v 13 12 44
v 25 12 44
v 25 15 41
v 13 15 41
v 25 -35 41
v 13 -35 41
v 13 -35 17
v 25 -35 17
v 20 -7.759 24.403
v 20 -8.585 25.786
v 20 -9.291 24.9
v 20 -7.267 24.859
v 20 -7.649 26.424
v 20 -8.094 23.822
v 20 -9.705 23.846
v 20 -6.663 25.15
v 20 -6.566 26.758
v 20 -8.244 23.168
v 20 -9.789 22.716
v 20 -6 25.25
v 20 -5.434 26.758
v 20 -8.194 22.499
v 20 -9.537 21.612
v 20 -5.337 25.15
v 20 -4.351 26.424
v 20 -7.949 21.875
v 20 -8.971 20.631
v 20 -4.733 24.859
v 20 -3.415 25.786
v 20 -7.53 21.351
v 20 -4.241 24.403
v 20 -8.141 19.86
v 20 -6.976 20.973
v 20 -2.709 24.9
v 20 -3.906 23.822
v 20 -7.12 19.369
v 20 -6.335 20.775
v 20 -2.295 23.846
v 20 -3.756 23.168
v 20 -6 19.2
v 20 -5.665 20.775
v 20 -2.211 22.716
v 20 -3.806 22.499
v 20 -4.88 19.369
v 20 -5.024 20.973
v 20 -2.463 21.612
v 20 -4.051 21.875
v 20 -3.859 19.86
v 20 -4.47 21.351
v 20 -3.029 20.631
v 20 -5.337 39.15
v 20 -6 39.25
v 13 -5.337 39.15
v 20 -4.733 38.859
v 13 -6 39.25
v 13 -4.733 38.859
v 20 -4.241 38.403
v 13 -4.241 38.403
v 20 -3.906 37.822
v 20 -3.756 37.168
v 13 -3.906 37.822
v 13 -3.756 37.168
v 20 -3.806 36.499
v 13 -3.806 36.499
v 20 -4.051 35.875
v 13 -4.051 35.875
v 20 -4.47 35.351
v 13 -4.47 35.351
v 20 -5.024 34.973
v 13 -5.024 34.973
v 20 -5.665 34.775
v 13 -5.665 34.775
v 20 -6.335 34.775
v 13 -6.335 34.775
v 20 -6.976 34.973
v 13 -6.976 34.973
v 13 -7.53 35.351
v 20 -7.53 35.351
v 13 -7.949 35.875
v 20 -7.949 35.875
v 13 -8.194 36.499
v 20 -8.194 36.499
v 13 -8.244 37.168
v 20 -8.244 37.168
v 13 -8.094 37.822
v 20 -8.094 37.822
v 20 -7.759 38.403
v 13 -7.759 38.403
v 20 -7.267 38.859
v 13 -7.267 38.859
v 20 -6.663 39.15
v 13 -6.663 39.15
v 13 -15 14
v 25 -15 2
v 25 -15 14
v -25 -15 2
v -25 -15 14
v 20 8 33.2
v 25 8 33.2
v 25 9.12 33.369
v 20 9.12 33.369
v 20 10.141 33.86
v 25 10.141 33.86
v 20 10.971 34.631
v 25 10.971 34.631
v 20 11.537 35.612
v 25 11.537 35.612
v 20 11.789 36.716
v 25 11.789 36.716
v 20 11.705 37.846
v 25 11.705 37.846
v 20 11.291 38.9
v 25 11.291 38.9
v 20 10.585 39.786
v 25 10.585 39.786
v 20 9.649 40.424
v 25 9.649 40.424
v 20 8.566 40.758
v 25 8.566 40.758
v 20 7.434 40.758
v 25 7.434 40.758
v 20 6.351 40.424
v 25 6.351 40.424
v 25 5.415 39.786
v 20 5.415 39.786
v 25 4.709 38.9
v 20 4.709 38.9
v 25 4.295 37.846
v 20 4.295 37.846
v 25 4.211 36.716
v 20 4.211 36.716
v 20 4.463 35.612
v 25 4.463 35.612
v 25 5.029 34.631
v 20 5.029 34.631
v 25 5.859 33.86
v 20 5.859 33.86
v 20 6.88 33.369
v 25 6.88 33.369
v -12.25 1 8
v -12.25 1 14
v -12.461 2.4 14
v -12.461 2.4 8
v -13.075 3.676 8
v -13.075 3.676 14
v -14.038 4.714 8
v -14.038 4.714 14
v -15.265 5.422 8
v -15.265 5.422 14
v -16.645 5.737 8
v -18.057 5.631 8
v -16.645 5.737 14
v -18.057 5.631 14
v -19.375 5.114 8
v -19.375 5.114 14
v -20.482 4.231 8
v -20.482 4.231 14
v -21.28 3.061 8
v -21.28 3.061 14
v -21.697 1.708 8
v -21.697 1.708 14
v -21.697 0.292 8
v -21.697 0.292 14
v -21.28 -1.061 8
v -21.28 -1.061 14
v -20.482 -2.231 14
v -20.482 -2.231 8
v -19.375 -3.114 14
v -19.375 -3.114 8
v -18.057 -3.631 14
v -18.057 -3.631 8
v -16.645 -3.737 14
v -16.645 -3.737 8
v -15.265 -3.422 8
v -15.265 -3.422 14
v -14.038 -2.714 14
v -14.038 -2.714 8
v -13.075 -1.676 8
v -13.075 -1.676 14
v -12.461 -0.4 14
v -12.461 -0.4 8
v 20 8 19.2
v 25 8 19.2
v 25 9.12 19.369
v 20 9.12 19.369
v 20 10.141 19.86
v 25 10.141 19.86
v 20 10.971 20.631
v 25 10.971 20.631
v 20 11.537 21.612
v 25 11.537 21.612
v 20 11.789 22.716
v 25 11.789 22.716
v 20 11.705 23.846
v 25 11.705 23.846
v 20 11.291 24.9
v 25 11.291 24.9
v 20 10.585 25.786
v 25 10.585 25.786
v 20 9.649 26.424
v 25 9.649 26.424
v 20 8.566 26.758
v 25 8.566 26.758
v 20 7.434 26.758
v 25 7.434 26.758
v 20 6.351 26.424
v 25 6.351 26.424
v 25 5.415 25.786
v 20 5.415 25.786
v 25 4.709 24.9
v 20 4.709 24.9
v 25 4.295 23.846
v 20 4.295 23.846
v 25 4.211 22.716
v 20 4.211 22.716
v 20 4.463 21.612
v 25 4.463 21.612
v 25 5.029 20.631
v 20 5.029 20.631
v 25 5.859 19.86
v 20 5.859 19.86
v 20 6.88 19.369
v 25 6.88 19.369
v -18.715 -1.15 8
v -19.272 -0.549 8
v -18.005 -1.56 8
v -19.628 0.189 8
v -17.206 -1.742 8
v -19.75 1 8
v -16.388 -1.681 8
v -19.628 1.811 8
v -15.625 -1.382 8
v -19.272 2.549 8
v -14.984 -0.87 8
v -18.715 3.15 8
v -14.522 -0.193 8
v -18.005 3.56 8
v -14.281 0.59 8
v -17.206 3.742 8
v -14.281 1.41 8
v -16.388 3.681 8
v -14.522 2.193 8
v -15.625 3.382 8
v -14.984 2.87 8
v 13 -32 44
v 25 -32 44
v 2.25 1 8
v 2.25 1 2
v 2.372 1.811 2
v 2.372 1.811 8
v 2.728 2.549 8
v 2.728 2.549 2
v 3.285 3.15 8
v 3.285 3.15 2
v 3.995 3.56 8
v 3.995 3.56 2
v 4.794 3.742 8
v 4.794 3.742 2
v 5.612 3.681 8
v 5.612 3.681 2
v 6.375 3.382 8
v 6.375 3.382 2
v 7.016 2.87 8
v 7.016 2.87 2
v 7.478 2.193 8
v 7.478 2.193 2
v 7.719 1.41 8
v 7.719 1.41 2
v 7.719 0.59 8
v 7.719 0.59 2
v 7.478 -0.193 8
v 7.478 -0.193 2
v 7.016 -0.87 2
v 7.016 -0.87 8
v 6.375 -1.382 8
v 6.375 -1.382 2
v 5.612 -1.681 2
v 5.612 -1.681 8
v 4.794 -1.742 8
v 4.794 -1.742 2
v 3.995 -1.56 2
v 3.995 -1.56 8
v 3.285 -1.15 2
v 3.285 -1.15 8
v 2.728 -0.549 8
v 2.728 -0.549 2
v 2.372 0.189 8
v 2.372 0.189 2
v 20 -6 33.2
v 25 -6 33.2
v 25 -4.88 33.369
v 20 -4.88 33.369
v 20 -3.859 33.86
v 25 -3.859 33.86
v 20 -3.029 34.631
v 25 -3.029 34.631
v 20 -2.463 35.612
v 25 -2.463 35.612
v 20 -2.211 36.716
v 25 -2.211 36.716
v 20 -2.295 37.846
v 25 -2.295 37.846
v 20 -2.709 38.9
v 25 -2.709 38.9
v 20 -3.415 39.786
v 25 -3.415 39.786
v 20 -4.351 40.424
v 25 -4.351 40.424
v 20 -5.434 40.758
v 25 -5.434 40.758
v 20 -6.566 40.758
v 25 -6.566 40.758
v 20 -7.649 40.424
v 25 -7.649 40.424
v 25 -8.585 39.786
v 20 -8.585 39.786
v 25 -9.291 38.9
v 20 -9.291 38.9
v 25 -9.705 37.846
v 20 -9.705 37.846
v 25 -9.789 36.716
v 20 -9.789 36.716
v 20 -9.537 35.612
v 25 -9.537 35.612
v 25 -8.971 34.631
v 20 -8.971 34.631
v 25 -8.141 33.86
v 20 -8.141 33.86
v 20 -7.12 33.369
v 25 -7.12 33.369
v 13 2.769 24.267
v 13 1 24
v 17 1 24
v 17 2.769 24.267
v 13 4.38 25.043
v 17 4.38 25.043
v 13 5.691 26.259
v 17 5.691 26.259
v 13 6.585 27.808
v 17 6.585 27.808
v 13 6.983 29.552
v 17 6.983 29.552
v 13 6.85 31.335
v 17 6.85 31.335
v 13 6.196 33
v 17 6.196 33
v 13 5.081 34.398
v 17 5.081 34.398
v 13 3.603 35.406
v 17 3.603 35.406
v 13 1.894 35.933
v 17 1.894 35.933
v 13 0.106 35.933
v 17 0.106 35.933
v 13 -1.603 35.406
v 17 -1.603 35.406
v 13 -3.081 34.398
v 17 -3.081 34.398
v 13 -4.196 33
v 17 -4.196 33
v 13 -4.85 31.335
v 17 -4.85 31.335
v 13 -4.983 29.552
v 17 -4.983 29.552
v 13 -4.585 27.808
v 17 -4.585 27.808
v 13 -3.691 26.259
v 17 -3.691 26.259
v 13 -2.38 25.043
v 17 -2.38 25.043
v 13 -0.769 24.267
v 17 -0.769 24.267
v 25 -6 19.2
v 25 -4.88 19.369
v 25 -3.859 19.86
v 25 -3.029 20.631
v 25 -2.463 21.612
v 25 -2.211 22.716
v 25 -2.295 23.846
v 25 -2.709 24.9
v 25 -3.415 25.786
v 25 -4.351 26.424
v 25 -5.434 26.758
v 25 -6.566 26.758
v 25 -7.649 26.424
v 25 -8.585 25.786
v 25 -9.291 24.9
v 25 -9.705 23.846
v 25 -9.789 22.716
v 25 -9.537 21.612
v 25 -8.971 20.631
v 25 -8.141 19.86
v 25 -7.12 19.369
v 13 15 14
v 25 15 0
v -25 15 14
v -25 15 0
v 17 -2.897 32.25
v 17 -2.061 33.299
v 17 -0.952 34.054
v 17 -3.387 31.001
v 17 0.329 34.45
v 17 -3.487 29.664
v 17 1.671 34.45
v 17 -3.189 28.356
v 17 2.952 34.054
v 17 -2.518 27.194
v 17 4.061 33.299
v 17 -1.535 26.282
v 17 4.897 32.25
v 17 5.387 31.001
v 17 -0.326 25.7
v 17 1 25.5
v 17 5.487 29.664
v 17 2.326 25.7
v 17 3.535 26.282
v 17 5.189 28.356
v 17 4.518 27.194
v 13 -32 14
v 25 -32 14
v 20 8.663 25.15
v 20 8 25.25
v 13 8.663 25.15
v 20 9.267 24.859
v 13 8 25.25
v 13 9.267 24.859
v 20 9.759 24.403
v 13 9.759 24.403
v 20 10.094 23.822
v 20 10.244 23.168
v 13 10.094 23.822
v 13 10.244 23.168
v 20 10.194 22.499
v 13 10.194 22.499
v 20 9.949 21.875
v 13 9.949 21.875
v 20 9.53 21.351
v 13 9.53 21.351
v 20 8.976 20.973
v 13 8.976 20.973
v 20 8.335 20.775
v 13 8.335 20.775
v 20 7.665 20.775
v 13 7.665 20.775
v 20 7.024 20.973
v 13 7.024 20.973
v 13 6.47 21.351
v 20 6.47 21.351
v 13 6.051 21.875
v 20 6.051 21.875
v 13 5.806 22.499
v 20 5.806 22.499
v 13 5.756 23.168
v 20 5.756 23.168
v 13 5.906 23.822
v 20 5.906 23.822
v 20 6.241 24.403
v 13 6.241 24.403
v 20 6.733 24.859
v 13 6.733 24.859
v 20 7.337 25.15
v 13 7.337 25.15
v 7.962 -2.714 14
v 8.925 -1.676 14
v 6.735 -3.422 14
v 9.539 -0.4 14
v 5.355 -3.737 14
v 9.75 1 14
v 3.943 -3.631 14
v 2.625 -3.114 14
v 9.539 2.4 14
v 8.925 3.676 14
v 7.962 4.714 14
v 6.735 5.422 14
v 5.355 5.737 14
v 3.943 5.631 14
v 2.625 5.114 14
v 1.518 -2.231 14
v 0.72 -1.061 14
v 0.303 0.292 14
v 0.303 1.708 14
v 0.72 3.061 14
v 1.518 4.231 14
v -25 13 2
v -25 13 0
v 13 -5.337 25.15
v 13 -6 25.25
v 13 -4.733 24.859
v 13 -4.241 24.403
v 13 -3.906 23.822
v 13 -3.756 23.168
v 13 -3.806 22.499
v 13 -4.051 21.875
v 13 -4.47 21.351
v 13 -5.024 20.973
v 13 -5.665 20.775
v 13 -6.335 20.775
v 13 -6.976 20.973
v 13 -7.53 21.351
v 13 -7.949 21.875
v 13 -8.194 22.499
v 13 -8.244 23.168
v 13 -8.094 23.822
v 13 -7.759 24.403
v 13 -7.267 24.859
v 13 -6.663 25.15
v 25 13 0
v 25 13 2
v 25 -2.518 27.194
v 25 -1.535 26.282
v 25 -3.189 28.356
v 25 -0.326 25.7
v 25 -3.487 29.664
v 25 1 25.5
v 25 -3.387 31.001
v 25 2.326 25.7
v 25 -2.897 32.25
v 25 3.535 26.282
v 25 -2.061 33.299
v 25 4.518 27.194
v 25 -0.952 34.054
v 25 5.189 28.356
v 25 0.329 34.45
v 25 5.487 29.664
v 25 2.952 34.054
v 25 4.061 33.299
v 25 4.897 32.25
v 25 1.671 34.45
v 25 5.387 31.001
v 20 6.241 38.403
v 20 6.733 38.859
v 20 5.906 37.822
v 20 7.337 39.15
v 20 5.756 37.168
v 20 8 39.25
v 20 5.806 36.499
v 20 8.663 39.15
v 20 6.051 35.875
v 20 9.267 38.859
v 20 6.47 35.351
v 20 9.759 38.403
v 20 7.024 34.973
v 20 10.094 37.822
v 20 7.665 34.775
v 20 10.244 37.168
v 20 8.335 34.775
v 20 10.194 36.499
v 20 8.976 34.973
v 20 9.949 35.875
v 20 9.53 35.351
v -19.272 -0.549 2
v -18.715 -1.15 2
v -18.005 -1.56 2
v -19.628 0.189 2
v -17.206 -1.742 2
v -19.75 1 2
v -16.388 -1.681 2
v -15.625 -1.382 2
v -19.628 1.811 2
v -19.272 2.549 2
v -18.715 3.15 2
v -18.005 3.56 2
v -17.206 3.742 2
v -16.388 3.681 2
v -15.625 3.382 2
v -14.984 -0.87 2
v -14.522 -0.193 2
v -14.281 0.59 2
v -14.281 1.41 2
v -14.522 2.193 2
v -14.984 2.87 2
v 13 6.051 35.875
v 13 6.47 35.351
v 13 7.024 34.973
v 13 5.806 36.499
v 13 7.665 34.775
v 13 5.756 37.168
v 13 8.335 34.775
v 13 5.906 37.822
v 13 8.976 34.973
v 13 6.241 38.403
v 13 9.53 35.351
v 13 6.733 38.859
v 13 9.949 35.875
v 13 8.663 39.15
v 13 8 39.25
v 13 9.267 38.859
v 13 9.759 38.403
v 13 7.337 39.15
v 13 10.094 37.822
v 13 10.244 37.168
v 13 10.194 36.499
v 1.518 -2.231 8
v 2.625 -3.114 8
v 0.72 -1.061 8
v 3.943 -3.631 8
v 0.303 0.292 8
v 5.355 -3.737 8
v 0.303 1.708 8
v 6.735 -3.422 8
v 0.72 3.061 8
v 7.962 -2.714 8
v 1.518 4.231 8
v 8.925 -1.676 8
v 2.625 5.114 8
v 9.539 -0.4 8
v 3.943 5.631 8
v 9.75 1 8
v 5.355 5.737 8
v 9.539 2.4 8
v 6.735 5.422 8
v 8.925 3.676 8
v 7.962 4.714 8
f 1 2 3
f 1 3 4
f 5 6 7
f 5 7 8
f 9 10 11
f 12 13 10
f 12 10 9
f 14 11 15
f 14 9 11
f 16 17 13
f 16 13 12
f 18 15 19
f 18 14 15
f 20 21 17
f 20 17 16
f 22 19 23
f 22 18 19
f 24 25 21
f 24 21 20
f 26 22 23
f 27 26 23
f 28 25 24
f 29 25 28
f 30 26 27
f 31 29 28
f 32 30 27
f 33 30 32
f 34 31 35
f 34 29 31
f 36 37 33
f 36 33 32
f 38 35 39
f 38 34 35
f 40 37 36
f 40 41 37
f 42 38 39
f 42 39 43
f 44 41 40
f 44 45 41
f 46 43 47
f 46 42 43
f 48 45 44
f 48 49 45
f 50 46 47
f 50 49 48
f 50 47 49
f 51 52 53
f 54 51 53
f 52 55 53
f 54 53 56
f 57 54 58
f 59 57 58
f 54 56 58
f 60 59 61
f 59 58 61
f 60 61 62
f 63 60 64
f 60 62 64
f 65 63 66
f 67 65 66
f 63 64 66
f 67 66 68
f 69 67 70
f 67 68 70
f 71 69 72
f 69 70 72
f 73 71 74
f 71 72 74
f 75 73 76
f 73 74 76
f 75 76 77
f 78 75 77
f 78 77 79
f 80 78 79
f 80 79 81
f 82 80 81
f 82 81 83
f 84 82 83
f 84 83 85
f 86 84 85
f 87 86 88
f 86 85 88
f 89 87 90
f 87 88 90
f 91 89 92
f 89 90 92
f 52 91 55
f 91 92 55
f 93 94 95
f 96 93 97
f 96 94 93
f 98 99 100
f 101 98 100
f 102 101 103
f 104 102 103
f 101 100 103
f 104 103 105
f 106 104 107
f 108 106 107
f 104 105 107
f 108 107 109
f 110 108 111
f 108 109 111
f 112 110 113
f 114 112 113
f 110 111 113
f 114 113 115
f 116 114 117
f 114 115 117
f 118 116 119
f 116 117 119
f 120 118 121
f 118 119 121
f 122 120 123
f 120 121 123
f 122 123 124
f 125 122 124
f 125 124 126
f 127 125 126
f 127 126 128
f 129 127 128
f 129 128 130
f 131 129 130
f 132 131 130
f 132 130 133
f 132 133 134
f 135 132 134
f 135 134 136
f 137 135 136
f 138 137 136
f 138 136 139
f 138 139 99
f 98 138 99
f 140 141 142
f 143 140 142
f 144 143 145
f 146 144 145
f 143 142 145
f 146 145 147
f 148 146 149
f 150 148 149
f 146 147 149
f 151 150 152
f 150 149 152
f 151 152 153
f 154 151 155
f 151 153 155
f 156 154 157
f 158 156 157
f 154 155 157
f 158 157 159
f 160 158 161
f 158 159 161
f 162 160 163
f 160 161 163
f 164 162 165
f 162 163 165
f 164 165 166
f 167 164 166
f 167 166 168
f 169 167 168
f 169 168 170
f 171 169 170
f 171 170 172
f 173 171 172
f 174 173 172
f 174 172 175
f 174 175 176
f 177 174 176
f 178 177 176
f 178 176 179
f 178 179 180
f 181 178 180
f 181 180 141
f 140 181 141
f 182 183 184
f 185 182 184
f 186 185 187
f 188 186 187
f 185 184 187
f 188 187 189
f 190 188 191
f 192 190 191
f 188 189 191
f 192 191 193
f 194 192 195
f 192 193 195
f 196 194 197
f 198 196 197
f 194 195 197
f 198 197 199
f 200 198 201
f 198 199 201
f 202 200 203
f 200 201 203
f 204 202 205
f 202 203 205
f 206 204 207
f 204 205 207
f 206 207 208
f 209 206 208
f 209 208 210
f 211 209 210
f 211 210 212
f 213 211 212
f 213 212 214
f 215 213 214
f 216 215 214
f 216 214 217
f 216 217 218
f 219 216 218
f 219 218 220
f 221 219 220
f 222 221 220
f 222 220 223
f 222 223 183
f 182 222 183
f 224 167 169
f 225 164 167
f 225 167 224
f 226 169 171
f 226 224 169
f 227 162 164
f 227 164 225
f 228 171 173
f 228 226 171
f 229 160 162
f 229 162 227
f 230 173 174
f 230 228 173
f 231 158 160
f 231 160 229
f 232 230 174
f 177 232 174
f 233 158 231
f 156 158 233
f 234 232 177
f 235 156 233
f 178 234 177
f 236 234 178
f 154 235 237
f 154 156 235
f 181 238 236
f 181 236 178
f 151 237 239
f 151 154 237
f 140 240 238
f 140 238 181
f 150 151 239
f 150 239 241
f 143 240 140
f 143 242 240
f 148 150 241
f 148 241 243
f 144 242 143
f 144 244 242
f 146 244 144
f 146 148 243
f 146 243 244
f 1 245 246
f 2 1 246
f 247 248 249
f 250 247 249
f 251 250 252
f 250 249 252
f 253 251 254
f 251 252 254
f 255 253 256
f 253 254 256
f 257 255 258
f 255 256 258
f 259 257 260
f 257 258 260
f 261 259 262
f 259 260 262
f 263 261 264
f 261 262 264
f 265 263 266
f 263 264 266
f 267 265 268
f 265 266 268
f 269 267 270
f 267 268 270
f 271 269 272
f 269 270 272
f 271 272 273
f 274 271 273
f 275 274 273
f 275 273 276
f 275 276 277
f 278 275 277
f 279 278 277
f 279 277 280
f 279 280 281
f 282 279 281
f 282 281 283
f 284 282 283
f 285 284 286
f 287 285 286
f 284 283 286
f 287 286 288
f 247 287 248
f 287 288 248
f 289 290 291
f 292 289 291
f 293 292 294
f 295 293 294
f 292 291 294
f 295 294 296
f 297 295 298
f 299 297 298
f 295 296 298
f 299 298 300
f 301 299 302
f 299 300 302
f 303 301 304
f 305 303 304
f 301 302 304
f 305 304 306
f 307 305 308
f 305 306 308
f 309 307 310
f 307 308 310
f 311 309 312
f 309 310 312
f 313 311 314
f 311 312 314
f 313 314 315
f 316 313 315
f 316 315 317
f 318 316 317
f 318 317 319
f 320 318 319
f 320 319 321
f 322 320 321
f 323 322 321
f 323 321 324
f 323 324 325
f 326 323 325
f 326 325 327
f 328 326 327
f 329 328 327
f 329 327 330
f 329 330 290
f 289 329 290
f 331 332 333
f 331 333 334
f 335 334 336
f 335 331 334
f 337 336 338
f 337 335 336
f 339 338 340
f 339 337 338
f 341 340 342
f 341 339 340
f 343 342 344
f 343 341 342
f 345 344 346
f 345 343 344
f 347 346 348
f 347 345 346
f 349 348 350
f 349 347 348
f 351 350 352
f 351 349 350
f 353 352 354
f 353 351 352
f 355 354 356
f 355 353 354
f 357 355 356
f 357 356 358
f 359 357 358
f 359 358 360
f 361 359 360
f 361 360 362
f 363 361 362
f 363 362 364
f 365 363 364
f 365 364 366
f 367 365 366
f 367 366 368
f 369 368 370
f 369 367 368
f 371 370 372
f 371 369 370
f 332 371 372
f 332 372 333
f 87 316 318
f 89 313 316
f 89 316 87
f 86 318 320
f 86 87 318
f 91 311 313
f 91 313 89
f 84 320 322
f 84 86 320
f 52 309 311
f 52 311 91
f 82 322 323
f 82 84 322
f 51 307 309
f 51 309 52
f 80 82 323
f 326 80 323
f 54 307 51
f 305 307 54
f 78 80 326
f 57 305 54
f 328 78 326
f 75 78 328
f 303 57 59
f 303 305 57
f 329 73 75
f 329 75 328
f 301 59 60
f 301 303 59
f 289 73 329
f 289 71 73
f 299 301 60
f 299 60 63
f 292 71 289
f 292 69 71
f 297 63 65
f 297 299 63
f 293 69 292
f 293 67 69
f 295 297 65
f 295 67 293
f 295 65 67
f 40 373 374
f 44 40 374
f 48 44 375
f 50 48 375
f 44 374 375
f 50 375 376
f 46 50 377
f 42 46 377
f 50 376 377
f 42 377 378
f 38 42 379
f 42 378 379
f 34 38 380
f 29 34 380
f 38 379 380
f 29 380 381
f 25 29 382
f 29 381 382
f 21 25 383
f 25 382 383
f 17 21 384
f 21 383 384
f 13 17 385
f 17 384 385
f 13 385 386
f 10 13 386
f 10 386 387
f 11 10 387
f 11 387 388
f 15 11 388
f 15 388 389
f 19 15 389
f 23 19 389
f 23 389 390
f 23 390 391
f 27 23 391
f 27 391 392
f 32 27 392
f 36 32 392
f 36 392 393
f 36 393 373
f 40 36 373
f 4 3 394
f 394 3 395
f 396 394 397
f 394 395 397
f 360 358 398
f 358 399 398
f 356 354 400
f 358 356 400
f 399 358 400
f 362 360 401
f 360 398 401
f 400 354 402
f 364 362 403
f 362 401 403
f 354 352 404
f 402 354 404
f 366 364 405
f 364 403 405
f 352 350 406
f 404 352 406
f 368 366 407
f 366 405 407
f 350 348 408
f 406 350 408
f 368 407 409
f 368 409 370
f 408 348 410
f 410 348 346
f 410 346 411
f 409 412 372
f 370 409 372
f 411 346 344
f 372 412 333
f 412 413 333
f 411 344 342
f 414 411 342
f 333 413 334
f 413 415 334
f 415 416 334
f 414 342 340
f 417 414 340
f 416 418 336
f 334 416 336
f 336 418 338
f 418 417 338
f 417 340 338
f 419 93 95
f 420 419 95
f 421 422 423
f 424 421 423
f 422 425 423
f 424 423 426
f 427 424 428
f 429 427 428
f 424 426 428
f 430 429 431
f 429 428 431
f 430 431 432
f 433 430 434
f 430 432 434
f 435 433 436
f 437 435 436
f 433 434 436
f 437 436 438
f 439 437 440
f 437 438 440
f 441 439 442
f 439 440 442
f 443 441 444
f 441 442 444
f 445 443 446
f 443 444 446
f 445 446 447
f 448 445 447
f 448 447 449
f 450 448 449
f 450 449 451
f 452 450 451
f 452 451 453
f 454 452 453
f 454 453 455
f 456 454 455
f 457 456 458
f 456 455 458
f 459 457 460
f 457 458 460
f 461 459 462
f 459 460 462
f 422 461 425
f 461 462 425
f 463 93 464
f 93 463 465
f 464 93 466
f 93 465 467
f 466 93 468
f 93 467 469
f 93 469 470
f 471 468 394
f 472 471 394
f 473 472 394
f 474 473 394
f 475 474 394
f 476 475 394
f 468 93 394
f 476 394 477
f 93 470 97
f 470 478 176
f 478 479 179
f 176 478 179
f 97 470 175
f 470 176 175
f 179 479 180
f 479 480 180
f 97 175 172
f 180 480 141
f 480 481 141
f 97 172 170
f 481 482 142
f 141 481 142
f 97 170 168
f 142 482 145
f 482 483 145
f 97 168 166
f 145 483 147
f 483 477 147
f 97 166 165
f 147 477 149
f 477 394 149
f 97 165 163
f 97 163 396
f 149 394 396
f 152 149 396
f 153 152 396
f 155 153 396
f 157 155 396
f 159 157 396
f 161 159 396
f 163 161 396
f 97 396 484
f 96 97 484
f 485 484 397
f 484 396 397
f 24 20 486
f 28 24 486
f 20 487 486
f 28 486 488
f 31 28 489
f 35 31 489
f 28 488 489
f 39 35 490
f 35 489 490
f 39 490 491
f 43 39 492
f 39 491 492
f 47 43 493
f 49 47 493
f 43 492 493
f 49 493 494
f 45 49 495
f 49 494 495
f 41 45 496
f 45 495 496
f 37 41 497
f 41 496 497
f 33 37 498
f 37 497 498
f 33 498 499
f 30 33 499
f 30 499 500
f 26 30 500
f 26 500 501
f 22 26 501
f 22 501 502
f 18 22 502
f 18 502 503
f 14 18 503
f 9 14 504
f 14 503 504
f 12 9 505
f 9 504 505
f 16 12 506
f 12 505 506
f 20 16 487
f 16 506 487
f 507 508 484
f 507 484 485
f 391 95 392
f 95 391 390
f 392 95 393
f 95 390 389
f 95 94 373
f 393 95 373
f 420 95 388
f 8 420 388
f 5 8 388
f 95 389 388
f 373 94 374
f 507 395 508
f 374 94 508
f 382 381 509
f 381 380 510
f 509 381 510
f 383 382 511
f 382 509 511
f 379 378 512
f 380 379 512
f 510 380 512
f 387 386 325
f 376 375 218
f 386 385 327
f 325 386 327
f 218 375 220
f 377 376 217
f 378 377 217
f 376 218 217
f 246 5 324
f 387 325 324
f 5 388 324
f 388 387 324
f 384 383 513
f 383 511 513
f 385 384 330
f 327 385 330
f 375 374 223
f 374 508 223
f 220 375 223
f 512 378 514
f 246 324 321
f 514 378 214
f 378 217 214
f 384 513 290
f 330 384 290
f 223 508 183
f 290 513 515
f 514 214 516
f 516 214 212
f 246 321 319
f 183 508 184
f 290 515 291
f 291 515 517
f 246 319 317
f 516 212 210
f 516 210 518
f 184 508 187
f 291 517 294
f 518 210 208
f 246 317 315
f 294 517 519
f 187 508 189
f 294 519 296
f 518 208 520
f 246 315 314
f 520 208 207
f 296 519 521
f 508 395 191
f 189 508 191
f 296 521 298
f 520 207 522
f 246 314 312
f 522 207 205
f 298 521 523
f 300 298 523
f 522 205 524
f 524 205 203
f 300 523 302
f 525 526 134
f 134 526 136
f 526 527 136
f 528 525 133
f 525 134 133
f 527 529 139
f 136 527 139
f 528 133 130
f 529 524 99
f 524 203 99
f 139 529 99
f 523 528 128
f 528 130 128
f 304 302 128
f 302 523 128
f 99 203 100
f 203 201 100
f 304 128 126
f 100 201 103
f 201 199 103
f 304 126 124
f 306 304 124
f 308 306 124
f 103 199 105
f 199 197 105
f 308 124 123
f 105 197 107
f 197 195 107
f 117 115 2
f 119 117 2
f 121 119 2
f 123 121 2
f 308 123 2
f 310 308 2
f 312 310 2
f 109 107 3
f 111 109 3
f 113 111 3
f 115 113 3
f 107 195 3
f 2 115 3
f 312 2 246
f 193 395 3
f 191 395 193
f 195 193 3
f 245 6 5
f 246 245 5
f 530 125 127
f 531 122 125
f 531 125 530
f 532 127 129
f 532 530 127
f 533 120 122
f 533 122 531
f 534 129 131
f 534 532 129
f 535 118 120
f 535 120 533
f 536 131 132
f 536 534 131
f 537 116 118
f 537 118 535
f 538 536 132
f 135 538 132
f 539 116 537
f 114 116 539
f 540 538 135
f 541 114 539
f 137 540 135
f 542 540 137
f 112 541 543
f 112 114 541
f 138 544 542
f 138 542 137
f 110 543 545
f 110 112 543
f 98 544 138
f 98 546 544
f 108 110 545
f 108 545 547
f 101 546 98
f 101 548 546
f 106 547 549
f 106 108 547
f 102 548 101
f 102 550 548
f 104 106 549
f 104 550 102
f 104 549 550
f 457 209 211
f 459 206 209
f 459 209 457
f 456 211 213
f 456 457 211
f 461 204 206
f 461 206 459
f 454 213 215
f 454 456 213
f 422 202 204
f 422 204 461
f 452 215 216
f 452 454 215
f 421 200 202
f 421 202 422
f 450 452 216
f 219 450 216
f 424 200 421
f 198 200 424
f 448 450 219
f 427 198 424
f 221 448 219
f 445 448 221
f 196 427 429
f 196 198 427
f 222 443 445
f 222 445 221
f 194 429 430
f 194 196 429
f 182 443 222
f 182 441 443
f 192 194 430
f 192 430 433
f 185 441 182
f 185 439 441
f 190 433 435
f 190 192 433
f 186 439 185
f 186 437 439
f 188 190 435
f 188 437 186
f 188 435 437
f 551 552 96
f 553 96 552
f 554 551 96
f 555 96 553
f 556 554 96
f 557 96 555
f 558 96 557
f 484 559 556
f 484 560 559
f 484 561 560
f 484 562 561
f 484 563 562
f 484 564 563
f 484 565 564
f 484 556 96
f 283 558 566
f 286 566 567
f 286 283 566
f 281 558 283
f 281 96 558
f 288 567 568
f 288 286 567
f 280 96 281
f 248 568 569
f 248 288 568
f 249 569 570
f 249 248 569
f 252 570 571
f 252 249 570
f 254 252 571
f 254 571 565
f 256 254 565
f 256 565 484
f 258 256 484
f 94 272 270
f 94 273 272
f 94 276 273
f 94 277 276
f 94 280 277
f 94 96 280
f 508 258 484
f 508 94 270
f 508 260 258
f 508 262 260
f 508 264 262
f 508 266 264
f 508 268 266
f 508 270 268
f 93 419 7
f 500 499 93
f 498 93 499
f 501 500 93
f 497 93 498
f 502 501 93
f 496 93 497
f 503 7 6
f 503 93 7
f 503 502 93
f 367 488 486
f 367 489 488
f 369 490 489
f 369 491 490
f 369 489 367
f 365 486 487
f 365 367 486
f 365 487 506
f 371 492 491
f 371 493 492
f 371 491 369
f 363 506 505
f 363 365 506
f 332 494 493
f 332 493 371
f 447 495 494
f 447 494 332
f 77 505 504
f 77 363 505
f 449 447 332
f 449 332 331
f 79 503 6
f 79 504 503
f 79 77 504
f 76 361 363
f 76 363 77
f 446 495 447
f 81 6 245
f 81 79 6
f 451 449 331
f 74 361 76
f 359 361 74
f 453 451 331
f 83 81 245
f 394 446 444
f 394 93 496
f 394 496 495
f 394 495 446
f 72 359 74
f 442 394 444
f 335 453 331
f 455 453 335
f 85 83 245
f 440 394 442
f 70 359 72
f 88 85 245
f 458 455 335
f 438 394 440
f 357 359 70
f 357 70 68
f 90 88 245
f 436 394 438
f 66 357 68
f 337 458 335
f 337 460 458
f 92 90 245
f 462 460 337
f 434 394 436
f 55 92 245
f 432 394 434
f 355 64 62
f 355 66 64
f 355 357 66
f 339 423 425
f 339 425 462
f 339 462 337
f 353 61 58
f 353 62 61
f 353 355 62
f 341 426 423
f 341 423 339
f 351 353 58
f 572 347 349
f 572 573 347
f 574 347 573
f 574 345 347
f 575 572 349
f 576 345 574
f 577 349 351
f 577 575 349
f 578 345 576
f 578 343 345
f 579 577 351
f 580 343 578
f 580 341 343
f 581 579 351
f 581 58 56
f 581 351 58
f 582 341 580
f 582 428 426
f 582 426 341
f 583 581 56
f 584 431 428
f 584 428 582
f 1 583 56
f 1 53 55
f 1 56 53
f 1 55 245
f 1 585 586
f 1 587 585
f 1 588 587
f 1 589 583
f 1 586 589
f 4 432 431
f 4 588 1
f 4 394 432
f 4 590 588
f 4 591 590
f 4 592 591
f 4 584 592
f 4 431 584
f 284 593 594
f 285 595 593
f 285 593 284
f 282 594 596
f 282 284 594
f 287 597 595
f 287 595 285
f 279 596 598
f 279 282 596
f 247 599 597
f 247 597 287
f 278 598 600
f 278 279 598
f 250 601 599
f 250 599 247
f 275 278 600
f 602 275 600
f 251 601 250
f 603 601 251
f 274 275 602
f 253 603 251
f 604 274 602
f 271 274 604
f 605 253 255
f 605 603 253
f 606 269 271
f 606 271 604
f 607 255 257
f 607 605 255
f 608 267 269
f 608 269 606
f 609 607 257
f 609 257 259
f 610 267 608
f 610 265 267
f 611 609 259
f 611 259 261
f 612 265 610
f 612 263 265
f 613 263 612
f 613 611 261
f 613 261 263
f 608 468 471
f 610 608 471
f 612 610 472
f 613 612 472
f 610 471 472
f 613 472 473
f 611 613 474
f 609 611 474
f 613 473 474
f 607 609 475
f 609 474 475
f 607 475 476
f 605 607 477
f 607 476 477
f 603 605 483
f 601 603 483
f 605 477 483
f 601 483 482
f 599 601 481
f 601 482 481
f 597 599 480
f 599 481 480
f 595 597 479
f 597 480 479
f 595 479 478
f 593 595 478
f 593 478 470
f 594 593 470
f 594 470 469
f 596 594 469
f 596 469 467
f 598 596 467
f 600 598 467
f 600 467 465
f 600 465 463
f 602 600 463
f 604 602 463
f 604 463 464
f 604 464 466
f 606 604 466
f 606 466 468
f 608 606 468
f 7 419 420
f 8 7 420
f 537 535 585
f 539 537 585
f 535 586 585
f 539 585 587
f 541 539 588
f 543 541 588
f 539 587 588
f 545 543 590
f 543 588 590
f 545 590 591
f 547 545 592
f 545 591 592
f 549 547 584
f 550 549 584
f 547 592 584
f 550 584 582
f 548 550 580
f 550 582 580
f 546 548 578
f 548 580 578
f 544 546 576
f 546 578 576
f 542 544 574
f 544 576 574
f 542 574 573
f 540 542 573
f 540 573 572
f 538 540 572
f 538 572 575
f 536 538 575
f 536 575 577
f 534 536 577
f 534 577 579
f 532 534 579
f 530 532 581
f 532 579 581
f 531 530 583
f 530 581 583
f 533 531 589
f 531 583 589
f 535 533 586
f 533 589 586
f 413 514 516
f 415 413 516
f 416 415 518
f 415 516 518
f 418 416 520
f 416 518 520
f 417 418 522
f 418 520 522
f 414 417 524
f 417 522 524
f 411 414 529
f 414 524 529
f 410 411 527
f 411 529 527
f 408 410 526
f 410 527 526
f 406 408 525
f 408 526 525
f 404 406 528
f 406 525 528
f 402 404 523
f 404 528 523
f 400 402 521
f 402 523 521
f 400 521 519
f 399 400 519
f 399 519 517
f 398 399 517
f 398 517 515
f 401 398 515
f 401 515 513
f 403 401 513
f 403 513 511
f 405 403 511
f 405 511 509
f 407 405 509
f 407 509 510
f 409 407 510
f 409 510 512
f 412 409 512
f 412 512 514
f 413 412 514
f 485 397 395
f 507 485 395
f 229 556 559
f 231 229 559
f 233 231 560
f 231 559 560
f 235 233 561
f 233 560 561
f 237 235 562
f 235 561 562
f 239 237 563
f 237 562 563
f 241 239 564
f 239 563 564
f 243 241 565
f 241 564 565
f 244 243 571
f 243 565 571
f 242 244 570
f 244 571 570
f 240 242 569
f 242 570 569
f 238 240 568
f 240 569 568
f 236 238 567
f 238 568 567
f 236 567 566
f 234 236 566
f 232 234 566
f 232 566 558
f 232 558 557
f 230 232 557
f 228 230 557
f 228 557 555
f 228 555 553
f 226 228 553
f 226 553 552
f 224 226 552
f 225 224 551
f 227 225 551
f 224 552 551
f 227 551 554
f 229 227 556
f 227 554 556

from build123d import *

# Parameters (mm, degrees)
EXTRUDE_1_DEPTH           = 15
SKETCH_2_R                = 6
CUT_EXTRUDE_1_DEPTH       = 4
SKETCH_3_R                = 4.5
CUT_EXTRUDE_2_DEPTH       = 69.271516755
HOLE_WIZARD_1_D           = 4.5
HOLE_WIZARD_1_DEPTH       = 100
HOLE_WIZARD_1_CBORE_D     = 7.6
HOLE_WIZARD_1_CBORE_DEPTH = 5
HOLE_WIZARD_2_D           = 5.5
HOLE_WIZARD_2_DEPTH       = 100
HOLE_WIZARD_2_CBORE_D     = 9.5
HOLE_WIZARD_2_CBORE_DEPTH = 6
SKETCH_8_W                = 12
SKETCH_8_H                = 30
EXTRUDE_2_DEPTH           = 20
CHAMFER_1_SIZE            = 3
SKETCH_10_W               = 2
SKETCH_10_H               = 28
CUT_EXTRUDE_4_DEPTH       = 76.239617224


with BuildPart() as part:
    # 草图1 → 凸台-拉伸1 (new, symmetric)
    with BuildSketch(Plane(origin=(0, 0, 0), x_dir=(1, 0, 0), z_dir=(0, 1, 0))):
        Polygon((-25, 0), (25, 0), (25, -44), (13, -44), (13, -14), (-25, -14), align=None)
    extrude(amount=EXTRUDE_1_DEPTH, both=True)

    # 草图2 → 切除-拉伸1 (cut)
    with BuildSketch(Plane(origin=(13, 0, 0), x_dir=(0, 0, -1), z_dir=(1, 0, 0))):
        with Locations((-30, 1)):
            Circle(SKETCH_2_R)
    extrude(amount=CUT_EXTRUDE_1_DEPTH, mode=Mode.SUBTRACT)

    # 草图3 → 切除-拉伸2 (cut, through all)
    with BuildSketch(Plane(origin=(25, 0, 0), x_dir=(0, 0, -1), z_dir=(1, 0, 0))):
        with Locations((-30, 1)):
            Circle(SKETCH_3_R)
    extrude(amount=-CUT_EXTRUDE_2_DEPTH, mode=Mode.SUBTRACT)

    # 孔1
    with Locations(Plane(origin=(25, 11.754948617, 2.830371217), x_dir=(0, 0, -1), z_dir=(1, 0, 0))):
        with Locations((-20.169628783, -3.754948617), (-34.169628783, -3.754948617), (-20.169628783, -17.754948617), (-34.169628783, -17.754948617)):
            CounterBoreHole(HOLE_WIZARD_1_D / 2, HOLE_WIZARD_1_CBORE_D / 2, HOLE_WIZARD_1_CBORE_DEPTH, depth=HOLE_WIZARD_1_DEPTH)

    # 孔2
    with Locations(Plane(origin=(-5.053295234, -5.294643146, 14), x_dir=(1, 0, 0), z_dir=(0, 0, 1))):
        with Locations((10.053295234, 6.294643146), (-11.946704766, 6.294643146)):
            CounterBoreHole(HOLE_WIZARD_2_D / 2, HOLE_WIZARD_2_CBORE_D / 2, HOLE_WIZARD_2_CBORE_DEPTH, depth=HOLE_WIZARD_2_DEPTH)

    # 草图8 → 凸台-拉伸2 (add)
    with BuildSketch(Plane.XZ.offset(15)):
        with Locations((19, 29)):
            Rectangle(SKETCH_8_W, SKETCH_8_H)
    extrude(amount=EXTRUDE_2_DEPTH)

    # 倒角1
    chamfer_1_edges = [part.edges().sort_by_distance(p)[0] for p in [
        (19, 15, 44),
        (19, -35, 44),
        (19, -35, 14),
    ]]
    chamfer(chamfer_1_edges, length=CHAMFER_1_SIZE)

    # 草图10 → 切除-拉伸4 (cut, through all)
    with BuildSketch(Plane(origin=(25, 0, 0), x_dir=(0, 0, -1), z_dir=(1, 0, 0))):
        with Locations((-1, -1)):
            Rectangle(SKETCH_10_W, SKETCH_10_H)
    extrude(amount=-CUT_EXTRUDE_4_DEPTH, mode=Mode.SUBTRACT)


solid = part.part
